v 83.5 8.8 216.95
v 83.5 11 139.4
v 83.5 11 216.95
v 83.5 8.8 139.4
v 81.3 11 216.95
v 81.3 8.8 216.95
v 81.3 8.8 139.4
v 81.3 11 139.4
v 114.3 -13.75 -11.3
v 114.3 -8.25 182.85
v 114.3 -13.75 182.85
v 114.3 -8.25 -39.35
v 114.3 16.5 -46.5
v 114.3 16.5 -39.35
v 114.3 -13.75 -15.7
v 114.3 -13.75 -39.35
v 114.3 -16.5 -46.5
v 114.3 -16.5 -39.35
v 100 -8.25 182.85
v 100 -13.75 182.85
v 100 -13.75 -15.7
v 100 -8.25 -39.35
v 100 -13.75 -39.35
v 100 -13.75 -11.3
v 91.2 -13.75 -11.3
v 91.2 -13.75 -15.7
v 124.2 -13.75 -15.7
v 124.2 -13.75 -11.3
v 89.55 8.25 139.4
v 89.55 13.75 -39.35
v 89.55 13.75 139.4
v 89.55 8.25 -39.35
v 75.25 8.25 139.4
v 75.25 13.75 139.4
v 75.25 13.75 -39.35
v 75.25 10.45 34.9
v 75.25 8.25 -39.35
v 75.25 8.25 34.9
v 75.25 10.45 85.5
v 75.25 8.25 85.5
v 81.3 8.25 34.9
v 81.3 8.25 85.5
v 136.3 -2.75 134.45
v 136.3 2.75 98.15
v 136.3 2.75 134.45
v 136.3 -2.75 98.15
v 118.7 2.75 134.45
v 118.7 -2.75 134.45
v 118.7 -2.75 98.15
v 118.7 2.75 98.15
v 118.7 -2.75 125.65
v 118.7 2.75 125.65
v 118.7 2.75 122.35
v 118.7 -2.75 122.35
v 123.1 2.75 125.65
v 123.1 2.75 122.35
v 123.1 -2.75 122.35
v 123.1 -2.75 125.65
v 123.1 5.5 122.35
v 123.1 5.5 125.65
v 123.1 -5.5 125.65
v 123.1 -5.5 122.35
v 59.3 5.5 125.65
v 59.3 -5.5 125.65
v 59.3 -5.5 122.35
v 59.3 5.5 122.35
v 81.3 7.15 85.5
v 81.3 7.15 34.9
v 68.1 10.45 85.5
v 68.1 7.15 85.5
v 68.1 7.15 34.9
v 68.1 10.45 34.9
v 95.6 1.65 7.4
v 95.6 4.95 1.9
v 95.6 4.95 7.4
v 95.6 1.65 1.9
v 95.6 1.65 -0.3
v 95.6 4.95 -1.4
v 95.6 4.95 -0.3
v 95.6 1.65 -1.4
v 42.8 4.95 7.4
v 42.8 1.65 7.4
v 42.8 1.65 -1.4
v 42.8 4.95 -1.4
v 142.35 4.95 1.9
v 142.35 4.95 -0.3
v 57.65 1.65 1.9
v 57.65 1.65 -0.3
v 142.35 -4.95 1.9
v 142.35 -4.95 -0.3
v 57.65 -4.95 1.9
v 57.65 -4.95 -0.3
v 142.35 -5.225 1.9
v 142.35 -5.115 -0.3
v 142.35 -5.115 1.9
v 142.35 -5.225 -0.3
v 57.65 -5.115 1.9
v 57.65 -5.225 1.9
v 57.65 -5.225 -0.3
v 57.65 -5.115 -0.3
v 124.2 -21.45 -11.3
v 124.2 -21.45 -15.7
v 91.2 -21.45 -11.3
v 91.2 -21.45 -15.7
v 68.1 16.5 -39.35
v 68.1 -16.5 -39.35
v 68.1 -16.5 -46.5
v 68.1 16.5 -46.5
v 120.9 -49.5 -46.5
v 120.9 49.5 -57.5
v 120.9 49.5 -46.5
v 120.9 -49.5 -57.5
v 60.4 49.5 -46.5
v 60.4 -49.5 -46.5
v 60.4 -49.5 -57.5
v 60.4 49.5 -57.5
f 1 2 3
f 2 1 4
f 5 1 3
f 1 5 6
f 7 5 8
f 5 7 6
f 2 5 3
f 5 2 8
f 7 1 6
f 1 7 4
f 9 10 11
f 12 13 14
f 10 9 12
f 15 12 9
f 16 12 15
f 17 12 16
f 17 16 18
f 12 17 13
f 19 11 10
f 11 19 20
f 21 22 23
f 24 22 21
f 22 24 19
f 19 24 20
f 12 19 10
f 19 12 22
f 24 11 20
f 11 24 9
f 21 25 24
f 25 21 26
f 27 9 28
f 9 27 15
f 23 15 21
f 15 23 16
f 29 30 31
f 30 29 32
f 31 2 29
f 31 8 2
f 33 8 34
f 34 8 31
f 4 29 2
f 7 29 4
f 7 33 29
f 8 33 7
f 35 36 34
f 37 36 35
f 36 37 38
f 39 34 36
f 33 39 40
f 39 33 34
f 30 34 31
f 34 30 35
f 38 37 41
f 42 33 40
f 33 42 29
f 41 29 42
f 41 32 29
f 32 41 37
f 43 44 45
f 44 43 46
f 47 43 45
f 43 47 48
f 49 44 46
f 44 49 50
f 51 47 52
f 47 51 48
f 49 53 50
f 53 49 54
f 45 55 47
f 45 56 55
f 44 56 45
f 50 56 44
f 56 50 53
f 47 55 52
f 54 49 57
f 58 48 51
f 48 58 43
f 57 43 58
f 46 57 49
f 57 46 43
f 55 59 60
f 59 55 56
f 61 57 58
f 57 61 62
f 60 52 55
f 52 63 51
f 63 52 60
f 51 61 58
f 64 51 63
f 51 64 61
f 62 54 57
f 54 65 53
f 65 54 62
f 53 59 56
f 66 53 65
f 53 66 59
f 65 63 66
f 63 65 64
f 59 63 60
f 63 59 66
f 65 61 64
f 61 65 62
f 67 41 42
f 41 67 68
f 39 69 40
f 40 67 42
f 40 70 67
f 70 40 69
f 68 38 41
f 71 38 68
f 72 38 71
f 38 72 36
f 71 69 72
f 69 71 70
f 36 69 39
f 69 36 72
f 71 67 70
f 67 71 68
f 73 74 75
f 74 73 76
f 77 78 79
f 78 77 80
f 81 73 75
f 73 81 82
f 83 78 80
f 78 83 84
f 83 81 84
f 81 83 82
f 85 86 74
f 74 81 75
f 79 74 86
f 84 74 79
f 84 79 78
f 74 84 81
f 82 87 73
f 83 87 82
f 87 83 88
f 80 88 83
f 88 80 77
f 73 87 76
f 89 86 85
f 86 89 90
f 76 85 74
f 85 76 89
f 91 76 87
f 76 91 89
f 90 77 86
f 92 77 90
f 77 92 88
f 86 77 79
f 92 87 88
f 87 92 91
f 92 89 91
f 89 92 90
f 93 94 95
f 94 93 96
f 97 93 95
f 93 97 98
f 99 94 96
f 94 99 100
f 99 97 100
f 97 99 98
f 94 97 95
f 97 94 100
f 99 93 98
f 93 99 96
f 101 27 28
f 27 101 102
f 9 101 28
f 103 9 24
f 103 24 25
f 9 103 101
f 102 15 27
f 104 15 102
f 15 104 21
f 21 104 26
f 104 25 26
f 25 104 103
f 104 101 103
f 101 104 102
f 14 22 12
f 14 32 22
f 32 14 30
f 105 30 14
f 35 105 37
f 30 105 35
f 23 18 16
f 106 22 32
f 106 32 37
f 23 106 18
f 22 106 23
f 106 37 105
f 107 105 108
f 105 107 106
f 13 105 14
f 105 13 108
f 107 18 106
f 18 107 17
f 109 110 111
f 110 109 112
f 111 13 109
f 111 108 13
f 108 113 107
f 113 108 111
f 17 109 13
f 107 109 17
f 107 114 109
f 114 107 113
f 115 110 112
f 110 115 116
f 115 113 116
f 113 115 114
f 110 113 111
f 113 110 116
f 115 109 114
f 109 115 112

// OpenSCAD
//Cet assemblage 3D est réalisé à partir d'une phoro d'une oeuvre de Jean Gorin exposé au musée d'arts de Nantes
$fn=50;
translate([100,0,80]){
scale([1.1,1.1,1.1])
{
union()
{
//[1]
color([0,0,0])translate([-16,9,88])cube([2,2,73], center=true);
//[2]
color([254/255,254/255,254/255])translate([6.5,-10,-8])cube([13,5,203], center=true);
//[3]
color([254/255,254/255,254/255])translate([-16,10,-28])cube([13,5,164], center=true);
//[4]
color([254/255,254/255,254/255])translate([25,0,33])cube([16,5,33], center=true);
//[5]
color([254/255,254/255,254/255])translate([-8,0,40])cube([58,10,3], center=true);
//[6]
color([255/255,255/255,0/255])translate([-23,8,-18])cube([12,3,46], center=true);
//[7]
color([254/255,254/255,254/255])translate([-28,3,-70])cube([48,3,8], center=true);
//[8]
color([254/255,254/255,254/255])translate([0,0,-72])cube([77,9,2], center=true);
//[8a]
color([255/255,0/255,0/255])translate([0,-4.7,-72])cube([77,0.1,2], center=true);
//[9]
color([254/255,254/255,254/255])translate([7,-16,-85])cube([30,7,4], center=true);
//[10]
color([254/255,254/255,254/255])translate([-8,0,-112])cube([42,30,7], center=true);
//[11]
color([254/255,254/255,254/255])translate([-8.5,0,-120])cube([55,90,10], center=true);
//[Fond]
//rotate([0,0,0])color([175/255,175/255,175/255])translate([-37,60,-55])cube([110,1,300], center=true);
}
}
}
